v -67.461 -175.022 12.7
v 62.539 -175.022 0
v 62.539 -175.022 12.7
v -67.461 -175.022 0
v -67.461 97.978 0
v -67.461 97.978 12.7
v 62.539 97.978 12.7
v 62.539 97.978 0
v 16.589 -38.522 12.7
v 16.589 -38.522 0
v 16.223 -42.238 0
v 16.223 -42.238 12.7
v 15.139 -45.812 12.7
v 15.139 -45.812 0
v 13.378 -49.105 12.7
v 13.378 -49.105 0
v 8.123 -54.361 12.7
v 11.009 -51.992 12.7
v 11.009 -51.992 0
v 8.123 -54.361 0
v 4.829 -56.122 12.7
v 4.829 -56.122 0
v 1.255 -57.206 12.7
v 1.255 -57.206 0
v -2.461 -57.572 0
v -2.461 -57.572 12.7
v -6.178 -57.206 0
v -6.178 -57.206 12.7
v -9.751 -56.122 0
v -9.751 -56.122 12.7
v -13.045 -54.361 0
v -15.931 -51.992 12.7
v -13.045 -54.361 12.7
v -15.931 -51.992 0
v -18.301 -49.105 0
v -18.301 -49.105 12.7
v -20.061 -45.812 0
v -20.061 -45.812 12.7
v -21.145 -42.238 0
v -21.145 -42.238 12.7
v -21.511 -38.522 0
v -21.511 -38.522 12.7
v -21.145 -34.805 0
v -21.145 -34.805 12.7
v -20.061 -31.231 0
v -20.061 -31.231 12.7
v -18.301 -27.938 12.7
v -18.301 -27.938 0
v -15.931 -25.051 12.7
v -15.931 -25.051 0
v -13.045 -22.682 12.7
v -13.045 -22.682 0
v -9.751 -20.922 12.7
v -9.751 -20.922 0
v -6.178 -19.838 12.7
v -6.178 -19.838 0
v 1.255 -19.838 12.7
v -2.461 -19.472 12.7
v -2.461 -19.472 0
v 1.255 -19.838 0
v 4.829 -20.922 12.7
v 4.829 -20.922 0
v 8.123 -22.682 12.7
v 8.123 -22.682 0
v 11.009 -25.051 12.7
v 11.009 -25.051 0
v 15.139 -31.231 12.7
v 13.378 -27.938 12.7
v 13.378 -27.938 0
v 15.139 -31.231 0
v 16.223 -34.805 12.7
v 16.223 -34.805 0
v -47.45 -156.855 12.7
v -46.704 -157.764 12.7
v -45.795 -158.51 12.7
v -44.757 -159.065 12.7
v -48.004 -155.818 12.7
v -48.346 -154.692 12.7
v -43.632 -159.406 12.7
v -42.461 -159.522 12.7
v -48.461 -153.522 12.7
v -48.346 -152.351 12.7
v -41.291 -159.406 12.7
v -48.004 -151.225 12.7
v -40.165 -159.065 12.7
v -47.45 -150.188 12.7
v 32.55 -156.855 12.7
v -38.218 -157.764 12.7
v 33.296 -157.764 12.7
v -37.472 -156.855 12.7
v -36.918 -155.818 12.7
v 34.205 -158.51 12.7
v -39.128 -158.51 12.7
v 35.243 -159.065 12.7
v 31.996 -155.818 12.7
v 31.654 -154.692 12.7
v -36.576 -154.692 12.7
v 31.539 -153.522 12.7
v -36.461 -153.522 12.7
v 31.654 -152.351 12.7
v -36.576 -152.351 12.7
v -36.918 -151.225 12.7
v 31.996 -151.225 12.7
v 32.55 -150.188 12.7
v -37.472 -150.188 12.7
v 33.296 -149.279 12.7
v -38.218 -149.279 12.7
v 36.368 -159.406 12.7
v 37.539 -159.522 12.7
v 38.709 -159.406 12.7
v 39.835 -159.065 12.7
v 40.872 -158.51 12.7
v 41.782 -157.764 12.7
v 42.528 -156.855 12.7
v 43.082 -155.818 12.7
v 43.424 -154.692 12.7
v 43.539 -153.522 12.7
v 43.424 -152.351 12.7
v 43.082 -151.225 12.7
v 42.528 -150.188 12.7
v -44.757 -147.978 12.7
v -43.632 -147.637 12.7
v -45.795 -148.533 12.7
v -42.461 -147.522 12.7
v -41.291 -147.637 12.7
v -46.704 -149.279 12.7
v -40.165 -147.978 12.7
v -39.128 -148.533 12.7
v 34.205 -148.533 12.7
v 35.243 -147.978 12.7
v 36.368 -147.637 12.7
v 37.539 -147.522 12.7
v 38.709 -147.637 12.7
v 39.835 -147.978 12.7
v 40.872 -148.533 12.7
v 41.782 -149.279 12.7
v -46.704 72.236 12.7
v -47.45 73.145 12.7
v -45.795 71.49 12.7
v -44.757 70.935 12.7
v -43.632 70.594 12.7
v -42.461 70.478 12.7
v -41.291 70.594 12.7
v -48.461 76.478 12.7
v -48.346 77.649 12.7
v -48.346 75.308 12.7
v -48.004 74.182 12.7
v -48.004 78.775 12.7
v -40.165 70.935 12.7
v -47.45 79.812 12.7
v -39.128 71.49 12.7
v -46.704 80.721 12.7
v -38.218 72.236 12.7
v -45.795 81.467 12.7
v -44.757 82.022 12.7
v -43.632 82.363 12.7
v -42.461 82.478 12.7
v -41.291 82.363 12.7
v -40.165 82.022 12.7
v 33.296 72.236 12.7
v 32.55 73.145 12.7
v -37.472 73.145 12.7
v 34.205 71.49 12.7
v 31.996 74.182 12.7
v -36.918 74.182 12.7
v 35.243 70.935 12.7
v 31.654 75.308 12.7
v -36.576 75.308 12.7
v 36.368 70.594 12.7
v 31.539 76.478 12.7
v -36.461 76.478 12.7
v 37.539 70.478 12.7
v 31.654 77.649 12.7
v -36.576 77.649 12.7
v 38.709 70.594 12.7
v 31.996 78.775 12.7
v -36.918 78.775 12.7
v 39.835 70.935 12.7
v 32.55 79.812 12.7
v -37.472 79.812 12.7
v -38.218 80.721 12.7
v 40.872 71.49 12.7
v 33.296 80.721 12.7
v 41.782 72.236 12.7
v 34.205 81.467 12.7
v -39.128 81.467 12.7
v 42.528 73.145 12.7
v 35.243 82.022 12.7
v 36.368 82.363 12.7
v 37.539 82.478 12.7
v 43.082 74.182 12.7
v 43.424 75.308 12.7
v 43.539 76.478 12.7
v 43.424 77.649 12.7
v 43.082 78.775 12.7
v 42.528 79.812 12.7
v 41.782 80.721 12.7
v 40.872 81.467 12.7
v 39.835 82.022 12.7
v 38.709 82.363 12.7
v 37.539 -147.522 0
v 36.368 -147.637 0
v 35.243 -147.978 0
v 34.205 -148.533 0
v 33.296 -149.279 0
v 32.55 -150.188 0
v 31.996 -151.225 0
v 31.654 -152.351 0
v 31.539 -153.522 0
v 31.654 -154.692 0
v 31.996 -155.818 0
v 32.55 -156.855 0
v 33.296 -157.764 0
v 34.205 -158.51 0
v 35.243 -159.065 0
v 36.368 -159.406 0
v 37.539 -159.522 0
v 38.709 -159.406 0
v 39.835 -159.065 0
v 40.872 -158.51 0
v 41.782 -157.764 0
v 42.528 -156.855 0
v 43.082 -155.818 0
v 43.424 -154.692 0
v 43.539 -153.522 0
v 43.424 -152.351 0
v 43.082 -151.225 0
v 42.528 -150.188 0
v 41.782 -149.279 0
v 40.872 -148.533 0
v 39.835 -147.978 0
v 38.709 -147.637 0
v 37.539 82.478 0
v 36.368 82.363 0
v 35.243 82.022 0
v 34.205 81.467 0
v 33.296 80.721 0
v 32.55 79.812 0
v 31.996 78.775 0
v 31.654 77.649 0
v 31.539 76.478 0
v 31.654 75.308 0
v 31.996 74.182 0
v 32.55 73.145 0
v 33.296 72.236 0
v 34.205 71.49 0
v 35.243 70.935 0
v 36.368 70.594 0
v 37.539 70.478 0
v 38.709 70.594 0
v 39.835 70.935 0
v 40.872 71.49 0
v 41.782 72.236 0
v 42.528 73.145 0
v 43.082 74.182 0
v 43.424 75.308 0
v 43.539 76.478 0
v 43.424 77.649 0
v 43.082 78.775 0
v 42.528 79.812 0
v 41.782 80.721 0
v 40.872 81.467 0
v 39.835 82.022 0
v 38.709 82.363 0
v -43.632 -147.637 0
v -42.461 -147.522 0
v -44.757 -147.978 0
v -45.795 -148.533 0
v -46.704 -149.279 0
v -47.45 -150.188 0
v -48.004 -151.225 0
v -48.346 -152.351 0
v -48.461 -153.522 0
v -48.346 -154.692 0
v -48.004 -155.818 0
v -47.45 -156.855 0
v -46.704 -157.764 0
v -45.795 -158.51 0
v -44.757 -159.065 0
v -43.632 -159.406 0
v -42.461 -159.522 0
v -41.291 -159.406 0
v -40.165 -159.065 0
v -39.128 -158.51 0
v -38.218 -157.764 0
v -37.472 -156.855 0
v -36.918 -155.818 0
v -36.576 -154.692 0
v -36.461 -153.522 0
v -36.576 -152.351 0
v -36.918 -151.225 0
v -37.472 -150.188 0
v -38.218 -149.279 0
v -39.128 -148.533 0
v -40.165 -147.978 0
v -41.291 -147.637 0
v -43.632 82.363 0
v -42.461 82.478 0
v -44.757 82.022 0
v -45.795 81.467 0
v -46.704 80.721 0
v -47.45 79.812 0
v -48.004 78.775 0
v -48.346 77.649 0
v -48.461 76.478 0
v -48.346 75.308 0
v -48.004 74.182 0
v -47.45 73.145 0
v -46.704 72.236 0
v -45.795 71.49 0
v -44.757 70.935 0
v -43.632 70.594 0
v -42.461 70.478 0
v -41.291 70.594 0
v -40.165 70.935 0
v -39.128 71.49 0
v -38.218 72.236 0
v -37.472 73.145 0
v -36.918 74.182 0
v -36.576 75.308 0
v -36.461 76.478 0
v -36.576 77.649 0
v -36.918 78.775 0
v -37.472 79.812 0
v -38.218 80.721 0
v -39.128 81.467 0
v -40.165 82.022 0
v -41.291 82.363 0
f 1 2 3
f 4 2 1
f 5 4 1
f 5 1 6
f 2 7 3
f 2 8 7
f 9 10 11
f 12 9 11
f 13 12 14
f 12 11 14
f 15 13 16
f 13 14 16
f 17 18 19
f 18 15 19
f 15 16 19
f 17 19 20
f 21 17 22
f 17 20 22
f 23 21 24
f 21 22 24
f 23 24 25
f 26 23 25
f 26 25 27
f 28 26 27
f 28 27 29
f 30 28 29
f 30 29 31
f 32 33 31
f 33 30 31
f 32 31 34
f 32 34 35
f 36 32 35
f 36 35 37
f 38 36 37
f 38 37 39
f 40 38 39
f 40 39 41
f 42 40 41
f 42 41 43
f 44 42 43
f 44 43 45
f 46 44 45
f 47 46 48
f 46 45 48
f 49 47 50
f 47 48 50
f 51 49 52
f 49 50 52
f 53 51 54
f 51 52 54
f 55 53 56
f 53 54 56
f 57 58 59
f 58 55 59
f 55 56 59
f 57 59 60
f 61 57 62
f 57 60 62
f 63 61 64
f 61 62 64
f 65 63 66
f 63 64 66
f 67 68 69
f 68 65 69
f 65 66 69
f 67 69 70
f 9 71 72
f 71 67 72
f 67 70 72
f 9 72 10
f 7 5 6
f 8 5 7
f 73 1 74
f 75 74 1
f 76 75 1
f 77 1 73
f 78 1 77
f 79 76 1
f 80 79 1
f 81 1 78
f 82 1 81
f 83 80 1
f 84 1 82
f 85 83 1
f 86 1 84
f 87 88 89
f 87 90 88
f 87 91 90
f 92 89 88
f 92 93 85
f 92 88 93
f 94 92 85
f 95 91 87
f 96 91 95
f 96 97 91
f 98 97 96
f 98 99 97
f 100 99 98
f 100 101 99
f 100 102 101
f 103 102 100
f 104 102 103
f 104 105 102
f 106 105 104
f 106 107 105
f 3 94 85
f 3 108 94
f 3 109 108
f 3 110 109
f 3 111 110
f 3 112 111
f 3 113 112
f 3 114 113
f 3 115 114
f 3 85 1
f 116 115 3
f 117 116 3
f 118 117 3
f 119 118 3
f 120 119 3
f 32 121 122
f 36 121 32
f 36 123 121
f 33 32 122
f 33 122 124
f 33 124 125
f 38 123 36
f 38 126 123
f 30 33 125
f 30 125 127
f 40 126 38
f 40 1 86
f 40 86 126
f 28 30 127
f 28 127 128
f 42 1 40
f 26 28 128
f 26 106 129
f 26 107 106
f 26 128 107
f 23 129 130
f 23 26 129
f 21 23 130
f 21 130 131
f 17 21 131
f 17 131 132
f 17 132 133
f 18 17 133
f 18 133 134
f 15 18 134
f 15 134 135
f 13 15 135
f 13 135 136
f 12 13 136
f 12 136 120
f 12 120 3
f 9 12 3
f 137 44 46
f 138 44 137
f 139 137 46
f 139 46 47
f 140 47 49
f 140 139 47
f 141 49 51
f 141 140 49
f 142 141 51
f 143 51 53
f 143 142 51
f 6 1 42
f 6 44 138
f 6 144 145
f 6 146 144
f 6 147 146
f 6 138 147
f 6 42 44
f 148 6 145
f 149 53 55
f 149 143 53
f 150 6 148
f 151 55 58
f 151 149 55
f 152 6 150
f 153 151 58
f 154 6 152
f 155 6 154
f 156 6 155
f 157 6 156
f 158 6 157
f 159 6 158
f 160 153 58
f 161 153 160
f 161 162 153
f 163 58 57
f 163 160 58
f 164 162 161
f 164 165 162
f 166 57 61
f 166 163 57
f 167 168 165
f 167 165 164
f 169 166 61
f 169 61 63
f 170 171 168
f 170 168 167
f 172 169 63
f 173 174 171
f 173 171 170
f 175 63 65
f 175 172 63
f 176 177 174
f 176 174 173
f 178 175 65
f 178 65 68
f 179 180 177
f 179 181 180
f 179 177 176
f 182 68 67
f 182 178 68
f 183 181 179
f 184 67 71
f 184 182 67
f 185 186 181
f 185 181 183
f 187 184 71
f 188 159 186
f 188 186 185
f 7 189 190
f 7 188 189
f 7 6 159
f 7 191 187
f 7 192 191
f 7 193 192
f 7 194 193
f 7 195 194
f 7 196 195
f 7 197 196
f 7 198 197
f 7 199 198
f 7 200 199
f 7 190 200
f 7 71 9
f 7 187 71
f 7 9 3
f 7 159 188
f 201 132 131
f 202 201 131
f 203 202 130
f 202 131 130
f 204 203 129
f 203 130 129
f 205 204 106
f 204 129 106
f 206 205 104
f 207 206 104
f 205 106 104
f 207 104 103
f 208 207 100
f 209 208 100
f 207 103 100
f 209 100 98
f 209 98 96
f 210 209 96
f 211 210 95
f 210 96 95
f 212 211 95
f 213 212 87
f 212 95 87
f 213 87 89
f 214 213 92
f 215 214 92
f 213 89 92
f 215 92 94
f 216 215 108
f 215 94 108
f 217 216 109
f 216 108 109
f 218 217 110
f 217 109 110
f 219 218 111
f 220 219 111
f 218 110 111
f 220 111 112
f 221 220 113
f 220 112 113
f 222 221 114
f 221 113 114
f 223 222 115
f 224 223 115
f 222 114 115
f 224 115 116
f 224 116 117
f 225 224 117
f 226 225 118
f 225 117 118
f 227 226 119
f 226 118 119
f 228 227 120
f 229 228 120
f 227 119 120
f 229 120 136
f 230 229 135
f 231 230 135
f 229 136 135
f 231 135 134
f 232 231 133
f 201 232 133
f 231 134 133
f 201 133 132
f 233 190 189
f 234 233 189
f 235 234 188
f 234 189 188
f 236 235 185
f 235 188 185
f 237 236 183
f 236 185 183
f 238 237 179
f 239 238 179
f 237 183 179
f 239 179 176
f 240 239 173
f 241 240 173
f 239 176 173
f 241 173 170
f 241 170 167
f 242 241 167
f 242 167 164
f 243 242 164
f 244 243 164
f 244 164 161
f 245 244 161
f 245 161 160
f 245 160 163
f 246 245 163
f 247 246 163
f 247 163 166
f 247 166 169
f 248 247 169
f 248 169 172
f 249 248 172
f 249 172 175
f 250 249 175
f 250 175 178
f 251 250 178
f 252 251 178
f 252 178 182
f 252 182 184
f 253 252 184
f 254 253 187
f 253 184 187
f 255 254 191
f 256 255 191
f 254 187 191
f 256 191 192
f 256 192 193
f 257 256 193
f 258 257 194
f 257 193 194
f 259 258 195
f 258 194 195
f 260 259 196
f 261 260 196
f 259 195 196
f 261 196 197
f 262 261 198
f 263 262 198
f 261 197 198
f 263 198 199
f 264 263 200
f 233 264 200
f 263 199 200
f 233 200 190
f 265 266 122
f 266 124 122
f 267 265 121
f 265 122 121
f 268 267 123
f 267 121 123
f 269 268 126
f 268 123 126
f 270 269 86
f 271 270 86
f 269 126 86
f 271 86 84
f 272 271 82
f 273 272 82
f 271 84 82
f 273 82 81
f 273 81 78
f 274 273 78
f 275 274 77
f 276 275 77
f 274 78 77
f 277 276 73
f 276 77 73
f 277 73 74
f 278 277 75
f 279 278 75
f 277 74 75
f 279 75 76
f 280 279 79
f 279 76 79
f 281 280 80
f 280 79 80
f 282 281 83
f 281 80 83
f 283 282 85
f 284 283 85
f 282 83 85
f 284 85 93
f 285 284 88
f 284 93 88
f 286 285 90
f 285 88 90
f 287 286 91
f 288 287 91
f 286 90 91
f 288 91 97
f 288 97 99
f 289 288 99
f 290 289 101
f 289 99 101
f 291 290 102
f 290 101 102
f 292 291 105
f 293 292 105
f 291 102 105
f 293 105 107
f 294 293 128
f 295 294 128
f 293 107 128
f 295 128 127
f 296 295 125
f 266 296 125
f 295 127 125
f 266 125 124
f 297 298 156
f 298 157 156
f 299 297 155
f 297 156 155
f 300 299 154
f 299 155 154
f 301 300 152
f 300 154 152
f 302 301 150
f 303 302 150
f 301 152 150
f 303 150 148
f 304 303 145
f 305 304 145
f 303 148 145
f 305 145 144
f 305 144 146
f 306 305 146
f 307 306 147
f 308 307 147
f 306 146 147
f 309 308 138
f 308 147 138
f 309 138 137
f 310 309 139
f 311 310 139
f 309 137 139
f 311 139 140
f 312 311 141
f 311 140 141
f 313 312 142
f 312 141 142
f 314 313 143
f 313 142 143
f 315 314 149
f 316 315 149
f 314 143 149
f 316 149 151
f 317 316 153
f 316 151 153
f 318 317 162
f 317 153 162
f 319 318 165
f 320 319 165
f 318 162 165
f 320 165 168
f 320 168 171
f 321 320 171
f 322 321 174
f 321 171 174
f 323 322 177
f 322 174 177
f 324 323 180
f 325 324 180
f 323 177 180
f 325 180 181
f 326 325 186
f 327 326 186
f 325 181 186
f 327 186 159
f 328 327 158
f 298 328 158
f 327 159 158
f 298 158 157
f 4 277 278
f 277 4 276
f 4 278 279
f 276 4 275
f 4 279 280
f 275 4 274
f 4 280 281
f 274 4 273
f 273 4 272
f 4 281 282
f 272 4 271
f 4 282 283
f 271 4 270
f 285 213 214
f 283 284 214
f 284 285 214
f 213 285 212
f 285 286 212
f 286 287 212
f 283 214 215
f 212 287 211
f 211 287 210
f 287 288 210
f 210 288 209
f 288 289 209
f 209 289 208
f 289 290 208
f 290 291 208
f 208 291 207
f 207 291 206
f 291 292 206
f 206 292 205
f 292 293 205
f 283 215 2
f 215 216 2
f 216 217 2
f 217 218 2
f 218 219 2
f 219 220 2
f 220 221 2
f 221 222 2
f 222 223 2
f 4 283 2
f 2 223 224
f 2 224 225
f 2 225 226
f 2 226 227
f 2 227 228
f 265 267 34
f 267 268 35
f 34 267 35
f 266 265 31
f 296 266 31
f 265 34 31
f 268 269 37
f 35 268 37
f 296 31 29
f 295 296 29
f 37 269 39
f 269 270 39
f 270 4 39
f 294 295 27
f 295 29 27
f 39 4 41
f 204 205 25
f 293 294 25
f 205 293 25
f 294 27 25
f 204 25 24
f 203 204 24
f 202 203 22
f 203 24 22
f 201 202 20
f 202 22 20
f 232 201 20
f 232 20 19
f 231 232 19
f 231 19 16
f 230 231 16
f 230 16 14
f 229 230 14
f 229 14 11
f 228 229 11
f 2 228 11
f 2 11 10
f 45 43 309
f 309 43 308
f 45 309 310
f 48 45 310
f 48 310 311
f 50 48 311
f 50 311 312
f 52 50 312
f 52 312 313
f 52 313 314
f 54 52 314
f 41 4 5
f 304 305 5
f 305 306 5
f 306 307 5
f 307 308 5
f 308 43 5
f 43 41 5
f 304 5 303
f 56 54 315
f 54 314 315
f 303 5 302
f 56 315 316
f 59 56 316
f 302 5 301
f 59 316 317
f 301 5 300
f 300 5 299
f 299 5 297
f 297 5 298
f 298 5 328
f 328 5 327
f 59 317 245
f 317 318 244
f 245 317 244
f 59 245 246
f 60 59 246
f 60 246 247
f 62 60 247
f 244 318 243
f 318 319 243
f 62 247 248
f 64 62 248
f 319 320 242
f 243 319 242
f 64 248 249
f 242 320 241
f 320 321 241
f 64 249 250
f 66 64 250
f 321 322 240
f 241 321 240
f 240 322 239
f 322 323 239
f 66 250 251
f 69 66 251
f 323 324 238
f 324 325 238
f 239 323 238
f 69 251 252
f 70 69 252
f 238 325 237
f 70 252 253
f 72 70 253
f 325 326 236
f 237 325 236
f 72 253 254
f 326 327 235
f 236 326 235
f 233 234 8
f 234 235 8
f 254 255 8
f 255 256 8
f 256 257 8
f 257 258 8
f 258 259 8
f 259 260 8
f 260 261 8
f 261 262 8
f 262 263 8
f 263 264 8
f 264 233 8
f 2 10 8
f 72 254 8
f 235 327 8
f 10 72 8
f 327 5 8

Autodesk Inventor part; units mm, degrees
ref_plane "YZ Plane" through (0, 0, 0) normal (1, 0, 0) x (0, 1, 0)
ref_plane "XZ Plane" through (0, 0, 0) normal (0, 1, 0) x (-1, 0, 0)
ref_plane "XY Plane" through (0, 0, 0) normal (0, 0, 1) x (1, 0, 0)
sketch "Sketch1" plane through (0, 0, 0) normal (0, 0, 1) x (1, 0, 0)
  line L0 (-67.4611, 97.9784) -> (62.5389, 97.9784)
  line L1 (62.5389, 97.9784) -> (62.5389, -175.0216)
  line L2 (62.5389, -175.0216) -> (-67.4611, -175.0216)
  line L3 (-67.4611, -175.0216) -> (-67.4611, 97.9784)
  circle A0 centre (-2.4611, -38.5216) radius 19.05
  line L4 (-67.4611, -38.5216) -> (62.5389, -38.5216) construction
  line L5 (-2.4611, 97.9784) -> (-2.4611, -175.0216) construction
  point P0 (0, 0)
  point P1 (-2.4611, -38.5216)
  dimension "d0" = 38.1
  dimension "d3" = 130
  dimension "d4" = 273
extrude "Extrusion1" add sketch "Sketch1" along normal blind 12.7
sketch "Sketch2" plane through (0, 0, 0) normal (0, 0, -1) x (-1, 0, 0)
  line L0 (67.4611, -175.0216) -> (-62.5389, -175.0216) projected
  line L1 (67.4611, 97.9784) -> (67.4611, -175.0216) projected
  line L2 (-62.5389, 97.9784) -> (67.4611, 97.9784) projected
  line L3 (-62.5389, -175.0216) -> (-62.5389, 97.9784) projected
  circle A0 centre (2.4611, -38.5216) radius 19.05 projected
  line L4 (2.4611, -38.5216) -> (2.4611, -25.0418)
  line L5 (2.4611, -25.0418) -> (2.4611, -38.5216)
  line L6 (14.6161, -38.5216) -> (2.4611, -38.5216)
  point P0 (0, 0)
  point P1 (42.4611, 76.4784)
  point P2 (-37.5389, 76.4784)
  point P3 (-37.5389, -153.5216)
  point P4 (42.4611, -153.5216)
  dimension "d5" = 230
  dimension "d6" = 80
  dimension "d7" = 80
  dimension "d8" = 230
hole "Hole1" at (-42.4611, 76.4784, 0) at (37.5389, 76.4784, 0) at (37.5389, -153.5216, 0) at (-42.4611, -153.5216, 0) direction (0, 0, 1) diameter 12 end through all
equation "\"d7\" = d6"
equation "\"d8\" = d5"
properties part number "placa superior"
